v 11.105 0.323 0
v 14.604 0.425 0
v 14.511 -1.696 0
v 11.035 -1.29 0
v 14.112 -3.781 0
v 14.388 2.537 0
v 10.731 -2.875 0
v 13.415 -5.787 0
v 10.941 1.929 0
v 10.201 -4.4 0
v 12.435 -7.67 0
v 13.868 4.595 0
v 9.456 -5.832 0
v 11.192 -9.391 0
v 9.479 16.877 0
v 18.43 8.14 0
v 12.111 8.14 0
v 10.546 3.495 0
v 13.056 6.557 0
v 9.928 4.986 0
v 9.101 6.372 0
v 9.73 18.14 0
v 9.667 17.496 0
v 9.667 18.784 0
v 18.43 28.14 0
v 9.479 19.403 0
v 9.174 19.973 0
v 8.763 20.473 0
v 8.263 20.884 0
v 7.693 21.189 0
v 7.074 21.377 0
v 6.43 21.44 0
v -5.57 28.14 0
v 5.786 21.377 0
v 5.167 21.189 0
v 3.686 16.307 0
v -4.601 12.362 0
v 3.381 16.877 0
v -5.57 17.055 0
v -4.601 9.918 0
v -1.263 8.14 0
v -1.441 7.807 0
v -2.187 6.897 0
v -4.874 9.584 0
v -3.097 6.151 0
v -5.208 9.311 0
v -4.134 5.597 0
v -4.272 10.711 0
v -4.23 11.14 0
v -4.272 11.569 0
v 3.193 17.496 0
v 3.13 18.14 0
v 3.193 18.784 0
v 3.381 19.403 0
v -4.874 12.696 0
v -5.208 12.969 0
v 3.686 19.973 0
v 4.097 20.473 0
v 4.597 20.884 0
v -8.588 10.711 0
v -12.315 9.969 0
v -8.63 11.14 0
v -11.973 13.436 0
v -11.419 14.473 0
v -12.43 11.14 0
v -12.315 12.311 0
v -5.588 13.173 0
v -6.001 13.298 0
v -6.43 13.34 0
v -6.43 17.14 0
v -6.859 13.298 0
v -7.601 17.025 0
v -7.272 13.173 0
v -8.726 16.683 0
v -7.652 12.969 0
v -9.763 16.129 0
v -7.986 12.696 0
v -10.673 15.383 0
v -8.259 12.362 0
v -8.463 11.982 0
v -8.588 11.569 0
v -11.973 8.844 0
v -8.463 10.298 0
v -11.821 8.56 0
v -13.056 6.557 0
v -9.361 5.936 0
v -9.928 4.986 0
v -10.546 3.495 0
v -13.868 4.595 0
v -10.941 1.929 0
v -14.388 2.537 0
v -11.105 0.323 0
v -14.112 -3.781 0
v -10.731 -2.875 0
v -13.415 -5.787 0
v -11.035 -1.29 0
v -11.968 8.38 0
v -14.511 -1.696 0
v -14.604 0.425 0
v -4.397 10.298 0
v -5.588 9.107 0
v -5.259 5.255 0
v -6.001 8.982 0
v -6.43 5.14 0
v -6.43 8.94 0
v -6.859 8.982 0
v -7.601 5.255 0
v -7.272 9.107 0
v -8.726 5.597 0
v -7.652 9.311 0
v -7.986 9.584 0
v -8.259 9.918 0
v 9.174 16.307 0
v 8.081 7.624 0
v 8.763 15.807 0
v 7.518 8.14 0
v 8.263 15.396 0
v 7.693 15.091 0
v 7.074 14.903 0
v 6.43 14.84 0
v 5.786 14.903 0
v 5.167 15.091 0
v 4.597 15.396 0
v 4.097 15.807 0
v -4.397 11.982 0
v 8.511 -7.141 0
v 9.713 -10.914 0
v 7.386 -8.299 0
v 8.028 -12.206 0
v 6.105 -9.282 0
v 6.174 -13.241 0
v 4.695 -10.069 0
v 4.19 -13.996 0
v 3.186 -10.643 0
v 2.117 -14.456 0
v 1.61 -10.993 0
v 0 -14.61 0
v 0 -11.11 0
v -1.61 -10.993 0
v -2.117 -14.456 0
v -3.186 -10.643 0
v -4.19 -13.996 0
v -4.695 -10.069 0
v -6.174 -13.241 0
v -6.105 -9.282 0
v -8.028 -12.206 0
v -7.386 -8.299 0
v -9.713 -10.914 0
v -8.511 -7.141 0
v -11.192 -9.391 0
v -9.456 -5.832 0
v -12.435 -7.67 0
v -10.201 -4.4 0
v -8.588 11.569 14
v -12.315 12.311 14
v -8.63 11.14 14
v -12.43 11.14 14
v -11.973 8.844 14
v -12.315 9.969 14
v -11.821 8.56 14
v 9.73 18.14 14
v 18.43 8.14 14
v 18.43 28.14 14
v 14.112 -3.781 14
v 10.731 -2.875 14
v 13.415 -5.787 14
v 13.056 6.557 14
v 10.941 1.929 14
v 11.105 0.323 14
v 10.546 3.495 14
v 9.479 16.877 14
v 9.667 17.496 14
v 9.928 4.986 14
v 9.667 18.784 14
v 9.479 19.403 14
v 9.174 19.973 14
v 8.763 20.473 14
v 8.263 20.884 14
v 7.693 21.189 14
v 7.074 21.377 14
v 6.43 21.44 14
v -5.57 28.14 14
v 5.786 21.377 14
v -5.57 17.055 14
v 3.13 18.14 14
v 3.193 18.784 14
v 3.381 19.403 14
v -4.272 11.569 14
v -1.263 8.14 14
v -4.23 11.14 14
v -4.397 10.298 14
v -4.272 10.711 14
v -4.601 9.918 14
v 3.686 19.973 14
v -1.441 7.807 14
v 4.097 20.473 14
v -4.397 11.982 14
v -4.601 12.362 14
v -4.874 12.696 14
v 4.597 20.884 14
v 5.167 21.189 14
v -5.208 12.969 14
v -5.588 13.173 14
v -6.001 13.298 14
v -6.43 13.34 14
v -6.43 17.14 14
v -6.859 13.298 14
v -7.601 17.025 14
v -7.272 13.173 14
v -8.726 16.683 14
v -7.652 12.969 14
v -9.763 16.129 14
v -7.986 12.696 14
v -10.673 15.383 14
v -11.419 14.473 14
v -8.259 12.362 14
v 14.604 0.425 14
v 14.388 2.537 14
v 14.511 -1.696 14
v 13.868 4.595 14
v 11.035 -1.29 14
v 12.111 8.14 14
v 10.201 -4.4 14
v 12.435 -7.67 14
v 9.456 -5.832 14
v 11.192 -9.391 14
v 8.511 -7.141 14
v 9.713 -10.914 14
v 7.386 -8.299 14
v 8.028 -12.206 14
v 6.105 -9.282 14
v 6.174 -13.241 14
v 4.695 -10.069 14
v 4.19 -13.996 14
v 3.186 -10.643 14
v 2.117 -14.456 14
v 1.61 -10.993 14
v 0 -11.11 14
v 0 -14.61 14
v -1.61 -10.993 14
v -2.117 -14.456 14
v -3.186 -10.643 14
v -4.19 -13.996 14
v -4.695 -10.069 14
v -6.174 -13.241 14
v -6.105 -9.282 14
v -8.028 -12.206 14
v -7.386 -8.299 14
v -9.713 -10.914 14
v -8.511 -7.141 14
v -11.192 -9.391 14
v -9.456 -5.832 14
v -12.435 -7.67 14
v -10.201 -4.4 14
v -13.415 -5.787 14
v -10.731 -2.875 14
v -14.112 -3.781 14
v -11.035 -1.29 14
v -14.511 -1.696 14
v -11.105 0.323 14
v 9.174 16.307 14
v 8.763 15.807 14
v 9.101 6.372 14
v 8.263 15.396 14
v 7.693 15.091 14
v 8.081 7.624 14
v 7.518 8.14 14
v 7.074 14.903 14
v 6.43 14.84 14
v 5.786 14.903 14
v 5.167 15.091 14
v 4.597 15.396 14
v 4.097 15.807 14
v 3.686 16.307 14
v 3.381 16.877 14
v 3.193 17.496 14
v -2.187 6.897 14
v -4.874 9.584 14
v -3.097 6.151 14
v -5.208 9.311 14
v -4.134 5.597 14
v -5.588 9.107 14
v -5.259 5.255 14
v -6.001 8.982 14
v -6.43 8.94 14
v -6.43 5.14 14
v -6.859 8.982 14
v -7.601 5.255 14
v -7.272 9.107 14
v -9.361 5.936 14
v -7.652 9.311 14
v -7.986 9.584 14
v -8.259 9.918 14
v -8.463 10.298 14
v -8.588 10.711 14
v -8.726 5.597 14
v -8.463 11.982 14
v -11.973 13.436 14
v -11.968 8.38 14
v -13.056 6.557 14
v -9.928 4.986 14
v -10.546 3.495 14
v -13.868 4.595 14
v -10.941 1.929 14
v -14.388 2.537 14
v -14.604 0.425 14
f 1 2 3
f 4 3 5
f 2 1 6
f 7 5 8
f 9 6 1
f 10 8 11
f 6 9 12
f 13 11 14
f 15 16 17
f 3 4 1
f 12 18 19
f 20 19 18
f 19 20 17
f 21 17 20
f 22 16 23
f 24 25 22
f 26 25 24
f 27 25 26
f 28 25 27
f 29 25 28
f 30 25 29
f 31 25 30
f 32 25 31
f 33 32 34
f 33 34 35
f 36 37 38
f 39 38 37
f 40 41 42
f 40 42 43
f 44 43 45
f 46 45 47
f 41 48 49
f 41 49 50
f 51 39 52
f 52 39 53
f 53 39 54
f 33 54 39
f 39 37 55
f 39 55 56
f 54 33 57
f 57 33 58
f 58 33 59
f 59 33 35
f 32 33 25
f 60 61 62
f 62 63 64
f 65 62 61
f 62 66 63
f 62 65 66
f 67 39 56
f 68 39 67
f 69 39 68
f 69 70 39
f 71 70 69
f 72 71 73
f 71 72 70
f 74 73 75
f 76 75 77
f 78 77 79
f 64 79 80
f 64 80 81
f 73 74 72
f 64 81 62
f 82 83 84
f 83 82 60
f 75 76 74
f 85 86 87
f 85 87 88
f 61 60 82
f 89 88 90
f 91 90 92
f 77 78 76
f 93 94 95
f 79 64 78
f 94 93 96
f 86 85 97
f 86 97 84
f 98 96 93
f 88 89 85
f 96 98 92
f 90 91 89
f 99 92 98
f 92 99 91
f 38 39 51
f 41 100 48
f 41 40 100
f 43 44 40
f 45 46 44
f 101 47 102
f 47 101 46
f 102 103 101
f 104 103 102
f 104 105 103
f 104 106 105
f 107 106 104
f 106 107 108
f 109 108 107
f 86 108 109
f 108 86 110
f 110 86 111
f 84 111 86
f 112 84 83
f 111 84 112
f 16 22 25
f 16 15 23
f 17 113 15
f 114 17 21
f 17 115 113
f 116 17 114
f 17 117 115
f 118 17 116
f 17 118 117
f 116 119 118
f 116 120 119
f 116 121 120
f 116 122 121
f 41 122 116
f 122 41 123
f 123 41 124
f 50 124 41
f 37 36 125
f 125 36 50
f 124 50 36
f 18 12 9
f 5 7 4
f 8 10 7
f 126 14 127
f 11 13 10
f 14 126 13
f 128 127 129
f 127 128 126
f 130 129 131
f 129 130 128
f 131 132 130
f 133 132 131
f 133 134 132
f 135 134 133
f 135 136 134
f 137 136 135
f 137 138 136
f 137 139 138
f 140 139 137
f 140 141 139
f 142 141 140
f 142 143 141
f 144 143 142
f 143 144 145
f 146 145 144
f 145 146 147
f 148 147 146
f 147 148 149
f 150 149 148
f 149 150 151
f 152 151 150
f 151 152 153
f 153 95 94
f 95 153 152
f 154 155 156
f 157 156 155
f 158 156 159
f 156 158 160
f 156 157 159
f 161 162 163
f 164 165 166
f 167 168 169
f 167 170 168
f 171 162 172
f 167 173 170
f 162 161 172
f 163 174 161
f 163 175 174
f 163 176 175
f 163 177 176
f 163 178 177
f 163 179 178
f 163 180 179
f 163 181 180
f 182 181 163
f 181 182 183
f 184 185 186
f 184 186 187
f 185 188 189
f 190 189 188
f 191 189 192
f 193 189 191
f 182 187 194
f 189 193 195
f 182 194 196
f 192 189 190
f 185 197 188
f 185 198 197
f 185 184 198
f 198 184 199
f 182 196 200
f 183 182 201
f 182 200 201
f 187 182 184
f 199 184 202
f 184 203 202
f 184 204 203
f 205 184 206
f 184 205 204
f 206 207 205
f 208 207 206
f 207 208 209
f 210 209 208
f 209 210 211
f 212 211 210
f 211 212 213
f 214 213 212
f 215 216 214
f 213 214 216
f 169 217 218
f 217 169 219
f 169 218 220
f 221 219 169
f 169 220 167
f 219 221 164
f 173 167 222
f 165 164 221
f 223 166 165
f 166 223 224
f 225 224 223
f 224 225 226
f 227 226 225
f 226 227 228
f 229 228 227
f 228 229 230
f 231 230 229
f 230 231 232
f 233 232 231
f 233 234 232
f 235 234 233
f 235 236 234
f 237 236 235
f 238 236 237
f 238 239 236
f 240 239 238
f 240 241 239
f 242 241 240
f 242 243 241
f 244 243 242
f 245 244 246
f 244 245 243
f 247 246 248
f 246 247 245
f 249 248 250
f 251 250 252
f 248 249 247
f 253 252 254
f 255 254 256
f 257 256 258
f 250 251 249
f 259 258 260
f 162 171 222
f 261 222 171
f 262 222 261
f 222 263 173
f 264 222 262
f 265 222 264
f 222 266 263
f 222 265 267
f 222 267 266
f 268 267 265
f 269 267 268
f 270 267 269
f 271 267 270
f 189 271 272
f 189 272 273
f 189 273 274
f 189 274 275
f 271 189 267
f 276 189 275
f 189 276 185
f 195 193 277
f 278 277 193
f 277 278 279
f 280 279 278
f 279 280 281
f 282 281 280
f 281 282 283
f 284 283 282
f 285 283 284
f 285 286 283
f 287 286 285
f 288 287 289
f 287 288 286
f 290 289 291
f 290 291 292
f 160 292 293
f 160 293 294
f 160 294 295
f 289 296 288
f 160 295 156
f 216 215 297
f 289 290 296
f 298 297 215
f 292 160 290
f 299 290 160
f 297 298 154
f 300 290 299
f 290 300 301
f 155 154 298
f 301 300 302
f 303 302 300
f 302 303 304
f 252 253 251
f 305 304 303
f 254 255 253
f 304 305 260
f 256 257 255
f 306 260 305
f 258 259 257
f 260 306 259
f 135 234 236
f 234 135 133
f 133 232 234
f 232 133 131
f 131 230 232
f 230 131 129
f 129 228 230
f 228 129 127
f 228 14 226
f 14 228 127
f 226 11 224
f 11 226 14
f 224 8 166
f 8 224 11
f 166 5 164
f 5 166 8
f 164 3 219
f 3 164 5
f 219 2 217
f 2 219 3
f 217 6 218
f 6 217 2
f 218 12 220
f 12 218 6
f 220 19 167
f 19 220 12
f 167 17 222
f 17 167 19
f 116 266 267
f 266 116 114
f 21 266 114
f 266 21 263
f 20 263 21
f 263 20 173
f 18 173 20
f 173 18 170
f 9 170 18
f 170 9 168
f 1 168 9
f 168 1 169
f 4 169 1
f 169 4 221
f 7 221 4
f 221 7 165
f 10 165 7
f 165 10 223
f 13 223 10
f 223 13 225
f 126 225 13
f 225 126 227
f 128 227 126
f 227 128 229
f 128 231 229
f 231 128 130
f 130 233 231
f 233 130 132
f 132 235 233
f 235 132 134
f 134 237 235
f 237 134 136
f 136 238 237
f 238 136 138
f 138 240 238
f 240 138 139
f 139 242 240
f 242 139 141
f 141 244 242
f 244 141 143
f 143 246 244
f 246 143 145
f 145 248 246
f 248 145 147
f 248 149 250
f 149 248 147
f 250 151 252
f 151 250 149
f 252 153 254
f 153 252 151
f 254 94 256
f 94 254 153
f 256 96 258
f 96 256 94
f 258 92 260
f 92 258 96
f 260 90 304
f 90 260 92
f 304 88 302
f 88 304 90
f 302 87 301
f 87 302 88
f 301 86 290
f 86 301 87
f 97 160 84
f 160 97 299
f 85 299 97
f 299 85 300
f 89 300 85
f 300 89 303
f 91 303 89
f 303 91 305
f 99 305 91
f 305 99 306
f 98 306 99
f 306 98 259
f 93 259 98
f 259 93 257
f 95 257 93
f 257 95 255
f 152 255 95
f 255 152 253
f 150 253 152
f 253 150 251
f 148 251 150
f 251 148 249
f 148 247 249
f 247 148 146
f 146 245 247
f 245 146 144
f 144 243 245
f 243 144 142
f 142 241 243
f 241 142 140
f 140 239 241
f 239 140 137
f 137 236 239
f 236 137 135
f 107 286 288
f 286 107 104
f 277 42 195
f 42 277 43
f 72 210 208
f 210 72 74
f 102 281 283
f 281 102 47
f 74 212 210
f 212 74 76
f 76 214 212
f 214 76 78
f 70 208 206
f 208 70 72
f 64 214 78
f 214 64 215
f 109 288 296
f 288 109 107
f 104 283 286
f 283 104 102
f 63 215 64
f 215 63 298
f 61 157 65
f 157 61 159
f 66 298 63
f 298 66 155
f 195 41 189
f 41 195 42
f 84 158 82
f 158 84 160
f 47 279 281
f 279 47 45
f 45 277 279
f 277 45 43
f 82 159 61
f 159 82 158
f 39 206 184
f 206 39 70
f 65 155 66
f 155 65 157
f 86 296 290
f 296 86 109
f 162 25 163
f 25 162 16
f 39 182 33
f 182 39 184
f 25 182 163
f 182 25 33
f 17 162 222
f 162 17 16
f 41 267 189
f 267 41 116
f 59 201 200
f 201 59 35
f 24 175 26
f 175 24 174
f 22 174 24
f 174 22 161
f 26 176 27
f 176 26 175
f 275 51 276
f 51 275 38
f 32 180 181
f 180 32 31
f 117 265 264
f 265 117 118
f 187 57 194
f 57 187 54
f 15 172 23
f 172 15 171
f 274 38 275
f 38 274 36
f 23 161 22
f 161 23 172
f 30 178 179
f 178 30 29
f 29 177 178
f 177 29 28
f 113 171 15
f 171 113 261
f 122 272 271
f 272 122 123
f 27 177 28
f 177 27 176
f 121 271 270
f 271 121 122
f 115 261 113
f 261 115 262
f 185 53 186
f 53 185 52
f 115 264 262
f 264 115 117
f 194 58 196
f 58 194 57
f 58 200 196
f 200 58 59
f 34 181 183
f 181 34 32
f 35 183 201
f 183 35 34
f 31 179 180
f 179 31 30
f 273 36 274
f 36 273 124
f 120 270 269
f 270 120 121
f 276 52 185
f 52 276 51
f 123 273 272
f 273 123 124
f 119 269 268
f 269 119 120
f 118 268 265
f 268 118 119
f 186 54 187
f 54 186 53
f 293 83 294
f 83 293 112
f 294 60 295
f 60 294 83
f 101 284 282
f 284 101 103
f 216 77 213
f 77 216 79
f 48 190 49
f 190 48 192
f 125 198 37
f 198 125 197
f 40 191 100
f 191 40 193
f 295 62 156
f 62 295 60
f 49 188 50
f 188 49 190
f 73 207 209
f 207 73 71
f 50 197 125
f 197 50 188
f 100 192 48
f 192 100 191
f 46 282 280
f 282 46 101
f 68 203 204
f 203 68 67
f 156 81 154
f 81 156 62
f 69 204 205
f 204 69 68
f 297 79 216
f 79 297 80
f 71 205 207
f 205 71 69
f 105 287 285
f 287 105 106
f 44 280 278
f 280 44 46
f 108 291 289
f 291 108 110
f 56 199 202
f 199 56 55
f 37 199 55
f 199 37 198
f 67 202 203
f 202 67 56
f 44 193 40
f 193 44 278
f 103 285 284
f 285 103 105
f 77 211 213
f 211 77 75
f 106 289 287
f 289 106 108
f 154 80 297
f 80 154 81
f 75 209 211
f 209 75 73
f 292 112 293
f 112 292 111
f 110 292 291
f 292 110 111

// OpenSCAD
$fn = 32;

// ----------------------------------------------------------------------
// Pipe clamp: 29.22 mm ring, 3.5 mm wall, 14 mm wide
// ----------------------------------------------------------------------

// --- parameters (mm) ---
outer_r = 14.61;          // clamp outside radius
inner_r = 11.11;          // pipe bore radius
band = 3.5;               // band thickness
clamp_w = 14;             // clamp width
opening = 60;             // opening angle between the ends
lug_w = 24;               // lug width
lug_len = 20;             // lug length
bolt_d = 6.6;             // bolt hole
knuckle_d = 12;           // hinge knuckle diameter
pin_d = 4.4;              // hinge pin hole

clamp_profile = [[-7.305, 12.653], [-9.062, 11.46], [-10.627, 10.026], [-11.968, 8.38], [-13.056, 6.557], [-13.868, 4.595], [-14.388, 2.537], [-14.604, 0.425], [-14.511, -1.696], [-14.112, -3.781], [-13.415, -5.787], [-12.435, -7.67], [-11.192, -9.391], [-9.713, -10.914], [-8.028, -12.206], [-6.174, -13.241], [-4.19, -13.996], [-2.117, -14.456], [0, -14.61], [2.117, -14.456], [4.19, -13.996], [6.174, -13.241], [8.028, -12.206], [9.713, -10.914], [11.192, -9.391], [12.435, -7.67], [13.415, -5.787], [14.112, -3.781], [14.511, -1.696], [14.604, 0.425], [14.388, 2.537], [13.868, 4.595], [13.056, 6.557], [11.968, 8.38], [10.627, 10.026], [9.062, 11.46], [7.305, 12.653], [5.555, 9.622], [6.891, 8.715], [8.081, 7.624], [9.101, 6.372], [9.928, 4.986], [10.546, 3.495], [10.941, 1.929], [11.105, 0.323], [11.035, -1.29], [10.731, -2.875], [10.201, -4.4], [9.456, -5.832], [8.511, -7.141], [7.386, -8.299], [6.105, -9.282], [4.695, -10.069], [3.186, -10.643], [1.61, -10.993], [0, -11.11], [-1.61, -10.993], [-3.186, -10.643], [-4.695, -10.069], [-6.105, -9.282], [-7.386, -8.299], [-8.511, -7.141], [-9.456, -5.832], [-10.201, -4.4], [-10.731, -2.875], [-11.035, -1.29], [-11.105, 0.323], [-10.941, 1.929], [-10.546, 3.495], [-9.928, 4.986], [-9.101, 6.372], [-8.081, 7.624], [-6.891, 8.715], [-5.555, 9.622]];

difference() {
  union() {
    linear_extrude(height = clamp_w) polygon(clamp_profile);
    /* hinge knuckle, sunk 2 mm into the band end */
    translate([-6.43, 11.14, 0]) cylinder(h = clamp_w, d = knuckle_d);
    /* bolt lug on the other end */
    translate([-5.57, 8.14, 0]) cube([lug_w, 20, clamp_w]);
  }
  translate([6.43, 18.14, -2.5]) cylinder(h = clamp_w + 5, d = bolt_d);
  translate([-6.43, 11.14, -2.5]) cylinder(h = clamp_w + 5, d = pin_d);
}
